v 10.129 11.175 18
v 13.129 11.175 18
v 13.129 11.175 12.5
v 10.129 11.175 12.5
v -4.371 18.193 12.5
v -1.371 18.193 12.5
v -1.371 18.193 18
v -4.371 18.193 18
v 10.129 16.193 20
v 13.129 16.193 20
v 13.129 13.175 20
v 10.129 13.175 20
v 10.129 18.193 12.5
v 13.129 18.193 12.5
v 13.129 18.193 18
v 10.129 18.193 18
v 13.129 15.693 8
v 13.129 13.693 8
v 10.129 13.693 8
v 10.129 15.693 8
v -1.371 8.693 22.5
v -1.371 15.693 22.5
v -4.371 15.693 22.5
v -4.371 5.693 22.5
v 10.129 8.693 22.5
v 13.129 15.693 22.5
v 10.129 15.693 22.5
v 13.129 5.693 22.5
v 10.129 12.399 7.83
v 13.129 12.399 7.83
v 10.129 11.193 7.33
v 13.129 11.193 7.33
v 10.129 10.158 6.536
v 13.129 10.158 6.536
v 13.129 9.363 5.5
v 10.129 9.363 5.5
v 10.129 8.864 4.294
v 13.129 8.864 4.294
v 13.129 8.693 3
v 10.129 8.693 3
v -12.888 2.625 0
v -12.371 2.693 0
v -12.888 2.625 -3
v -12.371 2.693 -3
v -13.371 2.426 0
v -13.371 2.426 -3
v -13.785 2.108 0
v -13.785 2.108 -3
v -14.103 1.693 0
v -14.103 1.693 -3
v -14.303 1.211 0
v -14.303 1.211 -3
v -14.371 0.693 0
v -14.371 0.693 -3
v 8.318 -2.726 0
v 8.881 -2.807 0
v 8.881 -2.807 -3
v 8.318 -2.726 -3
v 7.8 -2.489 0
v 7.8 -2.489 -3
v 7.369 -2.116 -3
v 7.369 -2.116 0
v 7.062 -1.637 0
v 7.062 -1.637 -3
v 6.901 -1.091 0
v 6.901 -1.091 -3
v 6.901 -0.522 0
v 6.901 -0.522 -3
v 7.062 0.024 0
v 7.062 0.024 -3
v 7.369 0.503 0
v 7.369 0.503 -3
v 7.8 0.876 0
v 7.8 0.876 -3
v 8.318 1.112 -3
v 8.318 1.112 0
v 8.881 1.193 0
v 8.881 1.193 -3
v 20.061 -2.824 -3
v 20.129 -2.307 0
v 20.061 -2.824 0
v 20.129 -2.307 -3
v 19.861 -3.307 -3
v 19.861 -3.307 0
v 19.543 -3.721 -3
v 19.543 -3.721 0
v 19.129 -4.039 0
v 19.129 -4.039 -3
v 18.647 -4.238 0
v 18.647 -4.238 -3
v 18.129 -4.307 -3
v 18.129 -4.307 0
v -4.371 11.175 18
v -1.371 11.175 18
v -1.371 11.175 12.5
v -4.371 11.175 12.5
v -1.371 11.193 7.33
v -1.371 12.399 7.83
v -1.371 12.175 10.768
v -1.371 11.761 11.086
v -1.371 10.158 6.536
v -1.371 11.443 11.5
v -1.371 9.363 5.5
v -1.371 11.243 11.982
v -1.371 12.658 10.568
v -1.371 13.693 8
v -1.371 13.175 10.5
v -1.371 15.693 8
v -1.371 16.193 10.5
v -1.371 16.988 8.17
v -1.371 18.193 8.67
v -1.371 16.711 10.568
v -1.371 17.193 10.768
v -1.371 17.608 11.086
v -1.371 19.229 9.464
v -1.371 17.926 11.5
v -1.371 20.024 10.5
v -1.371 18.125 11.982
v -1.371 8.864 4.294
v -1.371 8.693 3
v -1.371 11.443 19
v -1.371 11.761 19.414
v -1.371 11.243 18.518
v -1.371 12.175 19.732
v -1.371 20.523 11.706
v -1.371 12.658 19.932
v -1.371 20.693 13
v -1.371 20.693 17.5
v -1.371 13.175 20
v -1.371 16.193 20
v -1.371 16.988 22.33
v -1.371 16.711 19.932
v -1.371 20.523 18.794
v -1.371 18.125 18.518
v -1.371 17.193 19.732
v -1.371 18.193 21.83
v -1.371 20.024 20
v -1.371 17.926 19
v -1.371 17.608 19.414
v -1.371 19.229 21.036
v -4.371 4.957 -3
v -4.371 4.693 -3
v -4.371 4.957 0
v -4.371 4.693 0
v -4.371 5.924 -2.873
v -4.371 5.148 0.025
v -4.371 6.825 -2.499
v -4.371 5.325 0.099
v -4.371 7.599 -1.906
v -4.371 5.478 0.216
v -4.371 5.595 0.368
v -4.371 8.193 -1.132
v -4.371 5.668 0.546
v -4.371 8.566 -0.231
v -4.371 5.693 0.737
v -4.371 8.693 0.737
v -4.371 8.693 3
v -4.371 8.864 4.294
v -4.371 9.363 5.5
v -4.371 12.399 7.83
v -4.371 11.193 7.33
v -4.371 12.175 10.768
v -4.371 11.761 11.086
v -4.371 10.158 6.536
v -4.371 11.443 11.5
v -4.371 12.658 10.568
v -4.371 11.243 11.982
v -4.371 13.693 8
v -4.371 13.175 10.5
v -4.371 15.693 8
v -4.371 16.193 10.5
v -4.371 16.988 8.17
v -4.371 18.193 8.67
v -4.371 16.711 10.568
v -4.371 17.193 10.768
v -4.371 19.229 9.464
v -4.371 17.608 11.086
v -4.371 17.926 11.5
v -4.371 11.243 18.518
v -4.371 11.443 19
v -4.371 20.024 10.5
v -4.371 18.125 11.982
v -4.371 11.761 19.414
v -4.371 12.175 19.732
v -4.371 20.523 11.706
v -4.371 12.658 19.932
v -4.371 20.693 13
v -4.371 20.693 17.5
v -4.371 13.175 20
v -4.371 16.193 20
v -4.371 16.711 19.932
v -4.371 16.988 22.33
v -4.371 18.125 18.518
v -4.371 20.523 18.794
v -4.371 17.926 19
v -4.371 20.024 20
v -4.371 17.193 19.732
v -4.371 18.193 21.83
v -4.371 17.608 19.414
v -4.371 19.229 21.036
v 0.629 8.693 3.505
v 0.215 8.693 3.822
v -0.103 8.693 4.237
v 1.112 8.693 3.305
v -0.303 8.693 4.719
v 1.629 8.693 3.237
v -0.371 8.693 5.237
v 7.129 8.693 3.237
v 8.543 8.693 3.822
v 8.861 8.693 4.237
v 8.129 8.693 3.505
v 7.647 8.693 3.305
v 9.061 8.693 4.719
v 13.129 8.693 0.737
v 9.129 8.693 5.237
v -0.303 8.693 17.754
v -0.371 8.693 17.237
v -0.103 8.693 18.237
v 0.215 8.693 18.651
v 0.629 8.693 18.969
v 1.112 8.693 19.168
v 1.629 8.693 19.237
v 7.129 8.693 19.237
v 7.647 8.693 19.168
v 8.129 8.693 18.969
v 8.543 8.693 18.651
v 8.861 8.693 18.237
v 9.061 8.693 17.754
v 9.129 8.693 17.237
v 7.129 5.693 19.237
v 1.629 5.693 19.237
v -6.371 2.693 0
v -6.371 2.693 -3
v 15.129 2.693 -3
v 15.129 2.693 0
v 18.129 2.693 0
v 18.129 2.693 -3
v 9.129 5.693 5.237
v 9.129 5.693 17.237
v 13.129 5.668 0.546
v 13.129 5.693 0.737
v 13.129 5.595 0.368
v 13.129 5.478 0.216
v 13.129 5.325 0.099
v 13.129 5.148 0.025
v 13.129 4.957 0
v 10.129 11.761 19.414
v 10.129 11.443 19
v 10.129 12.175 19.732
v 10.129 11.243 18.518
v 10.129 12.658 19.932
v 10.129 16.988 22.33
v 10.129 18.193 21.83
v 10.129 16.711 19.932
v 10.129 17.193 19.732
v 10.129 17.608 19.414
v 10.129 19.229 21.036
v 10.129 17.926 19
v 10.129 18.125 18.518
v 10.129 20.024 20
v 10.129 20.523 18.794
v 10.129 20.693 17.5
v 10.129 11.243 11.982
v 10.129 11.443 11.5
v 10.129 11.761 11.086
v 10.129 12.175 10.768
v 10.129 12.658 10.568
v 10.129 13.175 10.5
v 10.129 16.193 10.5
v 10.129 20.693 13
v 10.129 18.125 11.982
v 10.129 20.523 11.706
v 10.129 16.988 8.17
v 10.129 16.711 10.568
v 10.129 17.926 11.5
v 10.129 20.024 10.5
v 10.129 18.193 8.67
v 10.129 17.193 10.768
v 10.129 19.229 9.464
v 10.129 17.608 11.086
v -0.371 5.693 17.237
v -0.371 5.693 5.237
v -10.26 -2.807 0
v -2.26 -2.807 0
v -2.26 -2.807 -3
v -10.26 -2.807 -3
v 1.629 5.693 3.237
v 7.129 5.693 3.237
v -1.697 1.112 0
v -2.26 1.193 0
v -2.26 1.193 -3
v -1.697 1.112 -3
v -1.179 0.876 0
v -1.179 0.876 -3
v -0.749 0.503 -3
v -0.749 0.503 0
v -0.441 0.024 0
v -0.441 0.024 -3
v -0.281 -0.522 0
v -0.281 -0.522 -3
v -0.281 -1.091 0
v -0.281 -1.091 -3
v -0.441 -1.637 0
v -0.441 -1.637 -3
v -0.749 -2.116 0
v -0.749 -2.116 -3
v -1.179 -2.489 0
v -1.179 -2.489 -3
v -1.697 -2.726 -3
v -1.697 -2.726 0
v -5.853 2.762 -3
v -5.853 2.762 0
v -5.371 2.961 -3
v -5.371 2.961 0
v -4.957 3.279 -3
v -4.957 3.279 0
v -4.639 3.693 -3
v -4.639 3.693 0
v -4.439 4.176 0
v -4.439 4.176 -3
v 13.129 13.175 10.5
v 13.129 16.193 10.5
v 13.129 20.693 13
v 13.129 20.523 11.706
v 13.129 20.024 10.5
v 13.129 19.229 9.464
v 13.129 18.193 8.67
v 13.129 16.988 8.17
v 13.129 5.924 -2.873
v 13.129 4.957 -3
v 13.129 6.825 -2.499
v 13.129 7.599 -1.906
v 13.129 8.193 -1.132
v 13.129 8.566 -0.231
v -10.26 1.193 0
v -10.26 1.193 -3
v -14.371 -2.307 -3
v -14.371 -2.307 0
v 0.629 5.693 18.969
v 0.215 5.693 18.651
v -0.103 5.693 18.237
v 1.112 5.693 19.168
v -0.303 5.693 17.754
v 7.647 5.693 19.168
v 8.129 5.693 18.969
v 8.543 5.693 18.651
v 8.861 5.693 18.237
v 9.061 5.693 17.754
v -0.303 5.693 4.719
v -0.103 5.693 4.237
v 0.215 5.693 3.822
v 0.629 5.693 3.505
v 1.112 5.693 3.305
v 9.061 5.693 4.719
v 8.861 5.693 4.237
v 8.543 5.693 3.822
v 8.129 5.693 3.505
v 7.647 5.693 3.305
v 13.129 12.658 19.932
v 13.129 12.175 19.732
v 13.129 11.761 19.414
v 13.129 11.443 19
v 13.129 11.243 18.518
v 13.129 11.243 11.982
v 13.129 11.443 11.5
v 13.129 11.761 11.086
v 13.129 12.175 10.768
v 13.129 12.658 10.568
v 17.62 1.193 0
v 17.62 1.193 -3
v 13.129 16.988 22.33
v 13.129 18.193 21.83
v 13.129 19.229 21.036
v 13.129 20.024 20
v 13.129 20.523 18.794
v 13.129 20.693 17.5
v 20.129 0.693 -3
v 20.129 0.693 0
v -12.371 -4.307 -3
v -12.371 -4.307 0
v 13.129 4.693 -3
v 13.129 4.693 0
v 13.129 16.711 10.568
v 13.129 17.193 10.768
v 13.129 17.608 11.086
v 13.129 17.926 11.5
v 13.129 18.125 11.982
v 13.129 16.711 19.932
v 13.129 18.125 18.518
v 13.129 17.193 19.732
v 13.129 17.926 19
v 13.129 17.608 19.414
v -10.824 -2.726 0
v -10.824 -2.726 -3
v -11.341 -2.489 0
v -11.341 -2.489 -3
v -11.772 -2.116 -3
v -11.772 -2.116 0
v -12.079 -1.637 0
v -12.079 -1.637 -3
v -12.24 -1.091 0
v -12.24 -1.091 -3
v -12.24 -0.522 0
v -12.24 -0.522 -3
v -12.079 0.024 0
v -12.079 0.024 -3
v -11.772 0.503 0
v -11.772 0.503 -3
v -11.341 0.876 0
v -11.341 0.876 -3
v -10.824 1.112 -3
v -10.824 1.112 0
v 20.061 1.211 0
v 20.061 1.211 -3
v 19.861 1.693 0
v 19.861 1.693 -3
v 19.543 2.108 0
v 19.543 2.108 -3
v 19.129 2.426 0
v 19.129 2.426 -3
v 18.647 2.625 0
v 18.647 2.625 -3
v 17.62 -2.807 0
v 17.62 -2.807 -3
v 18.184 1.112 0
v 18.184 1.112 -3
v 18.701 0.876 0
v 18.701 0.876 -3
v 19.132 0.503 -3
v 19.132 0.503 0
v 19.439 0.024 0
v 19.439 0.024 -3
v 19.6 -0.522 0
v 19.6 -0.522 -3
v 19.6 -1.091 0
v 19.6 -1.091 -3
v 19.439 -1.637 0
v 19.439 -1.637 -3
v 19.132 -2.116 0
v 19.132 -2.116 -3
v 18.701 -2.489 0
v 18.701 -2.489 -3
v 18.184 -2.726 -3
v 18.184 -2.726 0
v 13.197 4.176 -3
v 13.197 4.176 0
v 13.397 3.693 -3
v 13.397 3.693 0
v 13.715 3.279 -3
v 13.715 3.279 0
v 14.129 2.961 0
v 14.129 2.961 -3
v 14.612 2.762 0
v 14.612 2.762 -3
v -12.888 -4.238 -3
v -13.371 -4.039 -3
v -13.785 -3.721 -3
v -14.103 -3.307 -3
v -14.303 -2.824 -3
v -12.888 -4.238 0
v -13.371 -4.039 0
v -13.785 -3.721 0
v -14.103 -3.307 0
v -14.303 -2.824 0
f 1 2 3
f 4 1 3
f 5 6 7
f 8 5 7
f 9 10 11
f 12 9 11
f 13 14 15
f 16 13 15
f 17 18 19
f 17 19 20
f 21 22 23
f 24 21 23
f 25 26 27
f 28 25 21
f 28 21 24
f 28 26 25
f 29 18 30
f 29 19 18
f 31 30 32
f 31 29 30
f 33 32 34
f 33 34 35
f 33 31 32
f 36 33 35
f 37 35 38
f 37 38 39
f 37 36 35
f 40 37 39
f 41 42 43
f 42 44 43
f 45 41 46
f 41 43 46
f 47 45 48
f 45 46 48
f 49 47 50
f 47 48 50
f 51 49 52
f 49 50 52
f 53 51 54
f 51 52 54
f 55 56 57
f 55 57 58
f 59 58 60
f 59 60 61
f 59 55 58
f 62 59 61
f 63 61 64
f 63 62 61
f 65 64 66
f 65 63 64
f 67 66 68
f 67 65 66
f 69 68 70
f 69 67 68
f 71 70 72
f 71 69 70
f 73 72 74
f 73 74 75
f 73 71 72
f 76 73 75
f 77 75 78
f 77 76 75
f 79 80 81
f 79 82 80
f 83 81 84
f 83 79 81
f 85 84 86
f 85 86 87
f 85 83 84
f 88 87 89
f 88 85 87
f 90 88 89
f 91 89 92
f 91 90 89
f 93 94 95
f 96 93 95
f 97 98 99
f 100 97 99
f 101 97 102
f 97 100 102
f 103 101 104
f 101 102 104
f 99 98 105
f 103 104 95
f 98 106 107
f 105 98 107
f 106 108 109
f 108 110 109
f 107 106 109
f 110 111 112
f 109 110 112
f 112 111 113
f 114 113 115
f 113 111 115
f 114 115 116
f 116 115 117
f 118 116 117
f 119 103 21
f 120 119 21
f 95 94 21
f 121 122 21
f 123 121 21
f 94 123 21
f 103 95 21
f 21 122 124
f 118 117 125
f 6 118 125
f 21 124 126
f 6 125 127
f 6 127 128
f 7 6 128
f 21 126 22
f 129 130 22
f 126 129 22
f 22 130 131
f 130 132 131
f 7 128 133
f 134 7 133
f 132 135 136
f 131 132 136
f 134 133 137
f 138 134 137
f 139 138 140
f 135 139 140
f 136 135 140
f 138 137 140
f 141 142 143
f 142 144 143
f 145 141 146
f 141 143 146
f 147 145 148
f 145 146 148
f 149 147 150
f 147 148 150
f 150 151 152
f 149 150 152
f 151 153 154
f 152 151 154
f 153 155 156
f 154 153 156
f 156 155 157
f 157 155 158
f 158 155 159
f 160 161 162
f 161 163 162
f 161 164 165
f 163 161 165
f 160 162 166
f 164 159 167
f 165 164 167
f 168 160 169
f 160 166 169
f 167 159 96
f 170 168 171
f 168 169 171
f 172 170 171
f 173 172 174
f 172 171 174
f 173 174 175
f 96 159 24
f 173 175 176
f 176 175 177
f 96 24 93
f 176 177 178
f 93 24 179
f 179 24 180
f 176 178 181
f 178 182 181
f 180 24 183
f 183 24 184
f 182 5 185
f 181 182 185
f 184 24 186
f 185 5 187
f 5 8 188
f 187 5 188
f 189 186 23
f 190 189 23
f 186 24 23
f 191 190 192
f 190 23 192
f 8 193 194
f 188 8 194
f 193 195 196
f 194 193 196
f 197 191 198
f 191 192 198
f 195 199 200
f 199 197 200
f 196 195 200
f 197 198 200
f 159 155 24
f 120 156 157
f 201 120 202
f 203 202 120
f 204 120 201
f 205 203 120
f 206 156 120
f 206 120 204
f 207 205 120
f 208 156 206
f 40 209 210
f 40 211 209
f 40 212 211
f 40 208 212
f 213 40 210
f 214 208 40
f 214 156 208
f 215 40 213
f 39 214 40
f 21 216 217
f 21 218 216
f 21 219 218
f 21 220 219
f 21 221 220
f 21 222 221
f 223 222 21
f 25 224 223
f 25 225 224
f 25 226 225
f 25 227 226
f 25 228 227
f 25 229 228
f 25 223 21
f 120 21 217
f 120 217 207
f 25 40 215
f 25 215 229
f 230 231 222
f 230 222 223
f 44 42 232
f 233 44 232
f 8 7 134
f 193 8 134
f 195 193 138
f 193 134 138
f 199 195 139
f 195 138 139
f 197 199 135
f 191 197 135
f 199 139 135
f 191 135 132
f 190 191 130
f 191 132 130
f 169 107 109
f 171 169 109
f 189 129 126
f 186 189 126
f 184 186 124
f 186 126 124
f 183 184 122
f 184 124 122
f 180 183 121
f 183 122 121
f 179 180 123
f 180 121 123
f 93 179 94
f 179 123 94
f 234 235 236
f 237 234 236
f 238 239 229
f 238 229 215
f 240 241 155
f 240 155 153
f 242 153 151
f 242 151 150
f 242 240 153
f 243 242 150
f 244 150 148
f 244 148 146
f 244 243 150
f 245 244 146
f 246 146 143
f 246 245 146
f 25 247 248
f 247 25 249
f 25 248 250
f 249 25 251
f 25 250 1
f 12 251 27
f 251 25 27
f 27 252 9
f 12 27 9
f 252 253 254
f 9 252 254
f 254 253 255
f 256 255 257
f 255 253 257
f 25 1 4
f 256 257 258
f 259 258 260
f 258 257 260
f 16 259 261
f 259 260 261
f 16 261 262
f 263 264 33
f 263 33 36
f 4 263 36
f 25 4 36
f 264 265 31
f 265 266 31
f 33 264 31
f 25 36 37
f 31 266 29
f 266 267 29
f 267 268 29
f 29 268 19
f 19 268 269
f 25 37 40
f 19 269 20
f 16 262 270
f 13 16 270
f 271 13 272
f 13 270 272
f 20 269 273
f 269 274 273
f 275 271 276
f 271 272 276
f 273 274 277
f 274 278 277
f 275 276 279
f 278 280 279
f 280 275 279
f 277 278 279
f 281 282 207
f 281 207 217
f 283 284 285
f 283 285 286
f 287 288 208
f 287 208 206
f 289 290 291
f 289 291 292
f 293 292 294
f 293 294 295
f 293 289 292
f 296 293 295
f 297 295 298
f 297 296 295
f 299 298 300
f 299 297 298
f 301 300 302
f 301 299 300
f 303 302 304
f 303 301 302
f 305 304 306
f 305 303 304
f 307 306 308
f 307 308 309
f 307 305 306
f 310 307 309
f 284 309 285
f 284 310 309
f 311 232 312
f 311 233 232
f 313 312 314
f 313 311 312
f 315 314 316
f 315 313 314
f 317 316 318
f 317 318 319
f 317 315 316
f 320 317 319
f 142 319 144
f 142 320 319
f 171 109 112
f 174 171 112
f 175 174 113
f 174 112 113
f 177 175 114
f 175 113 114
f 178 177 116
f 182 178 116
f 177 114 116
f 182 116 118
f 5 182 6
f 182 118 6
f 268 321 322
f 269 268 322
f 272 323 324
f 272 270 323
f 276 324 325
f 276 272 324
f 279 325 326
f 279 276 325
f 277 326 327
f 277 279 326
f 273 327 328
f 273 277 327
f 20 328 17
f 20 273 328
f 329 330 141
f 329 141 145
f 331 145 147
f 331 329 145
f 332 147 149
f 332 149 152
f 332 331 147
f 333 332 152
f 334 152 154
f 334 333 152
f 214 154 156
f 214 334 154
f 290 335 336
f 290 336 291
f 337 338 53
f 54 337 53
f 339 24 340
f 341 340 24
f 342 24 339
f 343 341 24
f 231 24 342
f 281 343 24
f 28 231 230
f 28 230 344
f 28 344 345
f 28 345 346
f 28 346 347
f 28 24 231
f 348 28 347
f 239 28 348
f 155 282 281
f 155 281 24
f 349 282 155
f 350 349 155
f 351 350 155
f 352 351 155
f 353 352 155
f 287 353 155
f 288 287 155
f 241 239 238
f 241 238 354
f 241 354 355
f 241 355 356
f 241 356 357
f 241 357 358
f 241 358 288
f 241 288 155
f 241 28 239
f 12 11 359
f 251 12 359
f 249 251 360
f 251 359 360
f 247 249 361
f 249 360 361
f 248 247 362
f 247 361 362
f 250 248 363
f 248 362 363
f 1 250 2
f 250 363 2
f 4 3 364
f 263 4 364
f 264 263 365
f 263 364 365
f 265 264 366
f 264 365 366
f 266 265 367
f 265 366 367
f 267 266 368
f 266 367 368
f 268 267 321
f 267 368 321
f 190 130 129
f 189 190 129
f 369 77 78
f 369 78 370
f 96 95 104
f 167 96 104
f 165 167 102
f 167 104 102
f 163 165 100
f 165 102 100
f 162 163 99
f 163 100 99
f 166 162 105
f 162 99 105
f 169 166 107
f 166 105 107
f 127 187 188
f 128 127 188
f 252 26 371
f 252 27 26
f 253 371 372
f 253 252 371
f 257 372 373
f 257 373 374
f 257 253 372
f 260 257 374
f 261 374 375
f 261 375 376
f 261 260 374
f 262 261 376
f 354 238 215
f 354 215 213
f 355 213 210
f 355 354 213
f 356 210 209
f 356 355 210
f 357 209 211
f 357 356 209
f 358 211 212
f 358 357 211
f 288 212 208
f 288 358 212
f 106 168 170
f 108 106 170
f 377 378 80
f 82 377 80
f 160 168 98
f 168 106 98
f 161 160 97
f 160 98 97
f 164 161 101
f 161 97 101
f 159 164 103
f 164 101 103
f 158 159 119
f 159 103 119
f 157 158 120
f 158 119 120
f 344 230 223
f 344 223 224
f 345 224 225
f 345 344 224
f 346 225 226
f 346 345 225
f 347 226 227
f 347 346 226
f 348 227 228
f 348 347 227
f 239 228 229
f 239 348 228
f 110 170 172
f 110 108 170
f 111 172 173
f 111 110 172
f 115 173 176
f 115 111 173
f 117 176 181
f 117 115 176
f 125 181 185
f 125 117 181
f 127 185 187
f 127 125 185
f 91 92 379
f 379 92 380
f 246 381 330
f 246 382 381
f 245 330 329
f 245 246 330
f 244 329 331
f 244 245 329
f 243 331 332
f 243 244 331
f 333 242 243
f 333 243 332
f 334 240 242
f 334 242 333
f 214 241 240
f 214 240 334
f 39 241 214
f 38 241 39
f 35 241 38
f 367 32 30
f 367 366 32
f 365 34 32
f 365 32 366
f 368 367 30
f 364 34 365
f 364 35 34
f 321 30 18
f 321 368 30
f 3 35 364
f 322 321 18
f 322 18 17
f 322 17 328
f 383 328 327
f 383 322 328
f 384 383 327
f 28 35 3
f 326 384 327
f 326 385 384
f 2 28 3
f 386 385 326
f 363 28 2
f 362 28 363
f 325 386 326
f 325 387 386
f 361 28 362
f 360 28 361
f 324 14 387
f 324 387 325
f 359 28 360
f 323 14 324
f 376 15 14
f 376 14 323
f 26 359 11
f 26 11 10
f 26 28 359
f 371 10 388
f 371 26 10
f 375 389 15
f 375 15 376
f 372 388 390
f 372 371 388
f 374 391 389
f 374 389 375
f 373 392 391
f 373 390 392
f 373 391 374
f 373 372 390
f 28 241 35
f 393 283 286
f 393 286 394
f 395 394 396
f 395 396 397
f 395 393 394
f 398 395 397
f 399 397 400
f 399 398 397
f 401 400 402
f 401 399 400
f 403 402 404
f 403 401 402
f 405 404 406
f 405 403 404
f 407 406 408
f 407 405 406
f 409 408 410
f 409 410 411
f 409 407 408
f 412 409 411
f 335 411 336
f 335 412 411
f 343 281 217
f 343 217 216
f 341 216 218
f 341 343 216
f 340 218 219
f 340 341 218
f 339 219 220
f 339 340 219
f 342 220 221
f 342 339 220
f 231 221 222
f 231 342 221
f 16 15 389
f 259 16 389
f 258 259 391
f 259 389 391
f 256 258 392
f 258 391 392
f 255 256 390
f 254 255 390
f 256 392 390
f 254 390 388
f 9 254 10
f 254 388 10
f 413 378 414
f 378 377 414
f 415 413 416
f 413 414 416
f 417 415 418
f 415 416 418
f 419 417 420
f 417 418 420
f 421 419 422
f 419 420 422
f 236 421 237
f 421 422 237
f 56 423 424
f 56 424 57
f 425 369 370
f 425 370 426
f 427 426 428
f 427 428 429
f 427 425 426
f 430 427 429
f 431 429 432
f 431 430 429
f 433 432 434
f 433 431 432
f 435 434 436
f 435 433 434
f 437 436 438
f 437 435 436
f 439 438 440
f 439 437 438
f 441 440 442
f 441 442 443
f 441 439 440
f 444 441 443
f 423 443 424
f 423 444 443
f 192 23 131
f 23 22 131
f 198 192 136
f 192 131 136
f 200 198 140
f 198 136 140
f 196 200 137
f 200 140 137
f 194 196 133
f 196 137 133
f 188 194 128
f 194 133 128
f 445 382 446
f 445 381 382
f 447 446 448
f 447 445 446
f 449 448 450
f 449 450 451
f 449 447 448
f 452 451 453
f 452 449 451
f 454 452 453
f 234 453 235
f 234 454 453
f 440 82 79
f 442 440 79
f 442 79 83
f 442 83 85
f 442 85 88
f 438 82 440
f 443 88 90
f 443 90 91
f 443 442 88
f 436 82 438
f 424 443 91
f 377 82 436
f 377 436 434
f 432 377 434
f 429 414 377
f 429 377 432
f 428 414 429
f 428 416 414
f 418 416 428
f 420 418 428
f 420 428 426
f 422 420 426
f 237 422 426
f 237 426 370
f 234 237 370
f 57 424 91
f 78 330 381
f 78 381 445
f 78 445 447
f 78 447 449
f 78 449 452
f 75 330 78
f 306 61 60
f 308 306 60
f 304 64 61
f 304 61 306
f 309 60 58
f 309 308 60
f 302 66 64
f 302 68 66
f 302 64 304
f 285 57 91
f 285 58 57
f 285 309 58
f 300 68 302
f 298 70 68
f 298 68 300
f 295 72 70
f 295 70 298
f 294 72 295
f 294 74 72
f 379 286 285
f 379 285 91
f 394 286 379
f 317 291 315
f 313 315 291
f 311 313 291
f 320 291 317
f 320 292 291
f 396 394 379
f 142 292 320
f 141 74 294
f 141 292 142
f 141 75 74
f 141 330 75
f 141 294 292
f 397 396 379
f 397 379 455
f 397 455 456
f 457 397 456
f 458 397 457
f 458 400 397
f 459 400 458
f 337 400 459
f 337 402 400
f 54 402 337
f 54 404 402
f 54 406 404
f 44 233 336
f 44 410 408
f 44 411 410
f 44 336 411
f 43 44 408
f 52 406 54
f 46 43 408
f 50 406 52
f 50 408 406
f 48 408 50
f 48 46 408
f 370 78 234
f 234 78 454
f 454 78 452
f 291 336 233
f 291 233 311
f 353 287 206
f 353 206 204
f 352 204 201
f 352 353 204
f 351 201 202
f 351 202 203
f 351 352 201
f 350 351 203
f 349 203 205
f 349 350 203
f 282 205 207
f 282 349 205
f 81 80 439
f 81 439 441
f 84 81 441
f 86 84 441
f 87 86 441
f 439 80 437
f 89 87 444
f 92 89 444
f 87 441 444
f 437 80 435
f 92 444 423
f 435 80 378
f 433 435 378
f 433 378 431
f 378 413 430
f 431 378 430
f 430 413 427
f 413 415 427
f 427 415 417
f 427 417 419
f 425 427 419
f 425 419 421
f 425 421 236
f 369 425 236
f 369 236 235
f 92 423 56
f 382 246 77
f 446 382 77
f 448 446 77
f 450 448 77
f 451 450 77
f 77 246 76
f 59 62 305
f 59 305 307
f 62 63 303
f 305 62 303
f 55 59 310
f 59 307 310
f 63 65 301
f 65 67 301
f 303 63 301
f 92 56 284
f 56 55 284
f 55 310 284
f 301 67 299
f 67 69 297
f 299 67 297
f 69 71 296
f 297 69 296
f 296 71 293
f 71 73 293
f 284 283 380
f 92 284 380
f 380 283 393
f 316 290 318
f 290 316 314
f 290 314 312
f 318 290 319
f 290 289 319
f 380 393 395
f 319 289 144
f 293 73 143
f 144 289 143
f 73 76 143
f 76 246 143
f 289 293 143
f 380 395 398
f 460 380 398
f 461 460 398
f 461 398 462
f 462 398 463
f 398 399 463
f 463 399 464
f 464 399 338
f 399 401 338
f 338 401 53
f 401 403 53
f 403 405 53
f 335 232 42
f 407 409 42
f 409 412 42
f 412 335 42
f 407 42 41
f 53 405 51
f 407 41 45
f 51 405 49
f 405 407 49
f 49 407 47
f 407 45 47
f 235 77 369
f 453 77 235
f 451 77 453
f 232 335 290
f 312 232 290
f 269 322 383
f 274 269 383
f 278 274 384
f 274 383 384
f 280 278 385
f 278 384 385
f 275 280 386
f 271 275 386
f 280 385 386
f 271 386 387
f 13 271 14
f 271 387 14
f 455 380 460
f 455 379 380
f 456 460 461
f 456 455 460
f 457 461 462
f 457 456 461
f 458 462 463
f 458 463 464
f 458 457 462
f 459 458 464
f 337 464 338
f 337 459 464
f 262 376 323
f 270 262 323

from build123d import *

# Parameters (mm, degrees)
FLANGE_BASE1_DEPTH             = 3
CORTE_EXTRUS_O1_DEPTH          = 3
ARESTA_FLANGE4_STRIP_W         = 13.4732
ARESTA_FLANGE4_STRIP_H         = 3
ARESTA_FLANGE4_STRIP_CUT_DEPTH = 17.5
ARESTA_FLANGE4_DEPTH           = 17.5
ESBO_O47_W                     = 14.5
ESBO_O47_H                     = 15
RESSALTO_EXTRUS_O1_DEPTH       = 3
FILETE1_R                      = 5
ESBO_O48_W                     = 14.5
ESBO_O48_H                     = 15
RESSALTO_EXTRUS_O2_DEPTH       = 3
FILETE2_R                      = 5
FILETE3_R                      = 2
CORTE_EXTRUS_O5_DEPTH          = 42.11835661
CORTE_EXTRUS_O6_DEPTH          = 3


# Sheet-metal steps are written as plain solids
with BuildPart() as part:
    # Esboço1 → Flange-base1 (new body)
    with BuildSketch(Plane.XY):
        Polygon((-14.370772566, 2.693459119), (-4.370772566, 2.693459119), (-4.370772566, 5.693459119), (13.129227434, 5.693459119), (13.129227434, 2.693459119), (20.129227434, 2.693459119), (20.129227434, -4.306540881), (-14.370772566, -4.306540881), align=None)
    extrude(amount=-FLANGE_BASE1_DEPTH)

    # Esboço8 → Corte-extrusão1 (cut)
    with BuildSketch(Plane.XY):
        with BuildLine():
            Line((-10.260200759, 1.193459119), (-2.260200759, 1.193459119))
            ThreePointArc((-2.260200759, 1.193459119), (-0.260200759, -0.806540881), (-2.260200759, -2.806540881))
            Line((-2.260200759, -2.806540881), (-10.260200759, -2.806540881))
            ThreePointArc((-10.260200759, -2.806540881), (-12.260200759, -0.806540881), (-10.260200759, 1.193459119))
        make_face()
        with BuildLine():
            Line((8.88097681, 1.193459119), (17.620096532, 1.193459119))
            ThreePointArc((17.620096532, 1.193459119), (19.620096532, -0.806540881), (17.620096532, -2.806540881))
            Line((17.620096532, -2.806540881), (8.88097681, -2.806540881))
            ThreePointArc((8.88097681, -2.806540881), (6.88097681, -0.806540881), (8.88097681, 1.193459119))
        make_face()
    extrude(amount=-CORTE_EXTRUS_O1_DEPTH, mode=Mode.SUBTRACT)

    # Aresta-Flange4 strip (across the edge) → Aresta-Flange4 strip cut (cut)
    with BuildSketch(Plane(origin=(13.129227434, 5.693459119, 0), x_dir=(0, -1, 0), z_dir=(-1, 0, 0))):
        with Locations((-6, -1.5)):
            Rectangle(ARESTA_FLANGE4_STRIP_W, ARESTA_FLANGE4_STRIP_H)
    extrude(amount=ARESTA_FLANGE4_STRIP_CUT_DEPTH, mode=Mode.SUBTRACT)

    # Aresta-Flange4 section (across the edge) → Aresta-Flange4 (add)
    with BuildSketch(Plane(origin=(13.129227434, 5.693459119, 0), x_dir=(0, -1, 0), z_dir=(-1, 0, 0))):
        with BuildLine():
            Line((-3, 0.7366), (-3, 22.5))
            Line((-3, 22.5), (0, 22.5))
            Line((0, 22.5), (0, 0.7366))
            ThreePointArc((0, 0.7366), (0.215745145, 0.215745145), (0.7366, 0))
            Line((0.7366, 0), (0.7366, -3))
            ThreePointArc((0.7366, -3), (-1.905575199, -1.905575199), (-3, 0.7366))
        make_face()
    extrude(amount=ARESTA_FLANGE4_DEPTH)

    # Esboço47 → Ressalto-extrusão1 (add)
    with BuildSketch(Plane(origin=(13.129227434, 0, 0), x_dir=(0, 0, -1), z_dir=(1, 0, 0))):
        with Locations((-15.25, 13.193459119)):
            Rectangle(ESBO_O47_W, ESBO_O47_H)
    extrude(amount=-RESSALTO_EXTRUS_O1_DEPTH)

    # Filete1
    filete1_edges = [part.edges().sort_by_distance(p)[0] for p in [
        (11.629227434, 20.693459119, 22.5),
        (11.629227434, 8.693459119, 8),
        (11.629227434, 20.693459119, 8),
    ]]
    fillet(filete1_edges, radius=FILETE1_R)

    # Esboço48 → Ressalto-extrusão2 (add)
    with BuildSketch(Plane.ZY.offset(4.370772566)):
        with Locations((15.25, 13.193459119)):
            Rectangle(ESBO_O48_W, ESBO_O48_H)
    extrude(amount=-RESSALTO_EXTRUS_O2_DEPTH)

    # Filete2
    filete2_edges = [part.edges().sort_by_distance(p)[0] for p in [
        (-2.870772566, 20.693459119, 22.5),
        (-2.870772566, 8.693459119, 8),
        (-2.870772566, 20.693459119, 8),
    ]]
    fillet(filete2_edges, radius=FILETE2_R)

    # Filete3
    filete3_edges = [part.edges().sort_by_distance(p)[0] for p in [
        (20.129227434, -4.306540881, -1.5),
        (-14.370772566, -4.306540881, -1.5),
        (-14.370772566, 2.693459119, -1.5),
        (-4.370772566, 2.693459119, -1.5),
        (13.129227434, 2.693459119, -1.5),
        (20.129227434, 2.693459119, -1.5),
    ]]
    fillet(filete3_edges, radius=FILETE3_R)

    # Esboço49 → Corte-extrusão5 (cut, through all)
    with BuildSketch(Plane(origin=(13.129227434, 0, 0), x_dir=(0, 0, -1), z_dir=(1, 0, 0))):
        with BuildLine():
            Line((-18, 11.175198381), (-12.5, 11.175198381))
            ThreePointArc((-12.5, 11.175198381), (-11.085786438, 11.760984819), (-10.5, 13.175198381))
            Line((-10.5, 13.175198381), (-10.5, 16.193459119))
            ThreePointArc((-10.5, 16.193459119), (-11.085786438, 17.607672682), (-12.5, 18.193459119))
            Line((-12.5, 18.193459119), (-18, 18.193459119))
            ThreePointArc((-18, 18.193459119), (-19.414213562, 17.607672682), (-20, 16.193459119))
            Line((-20, 16.193459119), (-20, 13.175198381))
            ThreePointArc((-20, 13.175198381), (-19.414213562, 11.760984819), (-18, 11.175198381))
        make_face()
    extrude(amount=-CORTE_EXTRUS_O5_DEPTH, mode=Mode.SUBTRACT)

    # Esboço50 → Corte-extrusão6 (cut)
    with BuildSketch(Plane.XZ.offset(-5.693459119)):
        with BuildLine():
            Line((1.629227434, 19.2366), (7.129227434, 19.2366))
            ThreePointArc((7.129227434, 19.2366), (8.543440996, 18.650813562), (9.129227434, 17.2366))
            Line((9.129227434, 17.2366), (9.129227434, 5.2366))
            ThreePointArc((9.129227434, 5.2366), (8.543440996, 3.822386438), (7.129227434, 3.2366))
            Line((7.129227434, 3.2366), (1.629227434, 3.2366))
            ThreePointArc((1.629227434, 3.2366), (0.215013871, 3.822386438), (-0.370772566, 5.2366))
            Line((-0.370772566, 5.2366), (-0.370772566, 17.2366))
            ThreePointArc((-0.370772566, 17.2366), (0.215013871, 18.650813562), (1.629227434, 19.2366))
        make_face()
    extrude(amount=-CORTE_EXTRUS_O6_DEPTH, mode=Mode.SUBTRACT)


solid = part.part
